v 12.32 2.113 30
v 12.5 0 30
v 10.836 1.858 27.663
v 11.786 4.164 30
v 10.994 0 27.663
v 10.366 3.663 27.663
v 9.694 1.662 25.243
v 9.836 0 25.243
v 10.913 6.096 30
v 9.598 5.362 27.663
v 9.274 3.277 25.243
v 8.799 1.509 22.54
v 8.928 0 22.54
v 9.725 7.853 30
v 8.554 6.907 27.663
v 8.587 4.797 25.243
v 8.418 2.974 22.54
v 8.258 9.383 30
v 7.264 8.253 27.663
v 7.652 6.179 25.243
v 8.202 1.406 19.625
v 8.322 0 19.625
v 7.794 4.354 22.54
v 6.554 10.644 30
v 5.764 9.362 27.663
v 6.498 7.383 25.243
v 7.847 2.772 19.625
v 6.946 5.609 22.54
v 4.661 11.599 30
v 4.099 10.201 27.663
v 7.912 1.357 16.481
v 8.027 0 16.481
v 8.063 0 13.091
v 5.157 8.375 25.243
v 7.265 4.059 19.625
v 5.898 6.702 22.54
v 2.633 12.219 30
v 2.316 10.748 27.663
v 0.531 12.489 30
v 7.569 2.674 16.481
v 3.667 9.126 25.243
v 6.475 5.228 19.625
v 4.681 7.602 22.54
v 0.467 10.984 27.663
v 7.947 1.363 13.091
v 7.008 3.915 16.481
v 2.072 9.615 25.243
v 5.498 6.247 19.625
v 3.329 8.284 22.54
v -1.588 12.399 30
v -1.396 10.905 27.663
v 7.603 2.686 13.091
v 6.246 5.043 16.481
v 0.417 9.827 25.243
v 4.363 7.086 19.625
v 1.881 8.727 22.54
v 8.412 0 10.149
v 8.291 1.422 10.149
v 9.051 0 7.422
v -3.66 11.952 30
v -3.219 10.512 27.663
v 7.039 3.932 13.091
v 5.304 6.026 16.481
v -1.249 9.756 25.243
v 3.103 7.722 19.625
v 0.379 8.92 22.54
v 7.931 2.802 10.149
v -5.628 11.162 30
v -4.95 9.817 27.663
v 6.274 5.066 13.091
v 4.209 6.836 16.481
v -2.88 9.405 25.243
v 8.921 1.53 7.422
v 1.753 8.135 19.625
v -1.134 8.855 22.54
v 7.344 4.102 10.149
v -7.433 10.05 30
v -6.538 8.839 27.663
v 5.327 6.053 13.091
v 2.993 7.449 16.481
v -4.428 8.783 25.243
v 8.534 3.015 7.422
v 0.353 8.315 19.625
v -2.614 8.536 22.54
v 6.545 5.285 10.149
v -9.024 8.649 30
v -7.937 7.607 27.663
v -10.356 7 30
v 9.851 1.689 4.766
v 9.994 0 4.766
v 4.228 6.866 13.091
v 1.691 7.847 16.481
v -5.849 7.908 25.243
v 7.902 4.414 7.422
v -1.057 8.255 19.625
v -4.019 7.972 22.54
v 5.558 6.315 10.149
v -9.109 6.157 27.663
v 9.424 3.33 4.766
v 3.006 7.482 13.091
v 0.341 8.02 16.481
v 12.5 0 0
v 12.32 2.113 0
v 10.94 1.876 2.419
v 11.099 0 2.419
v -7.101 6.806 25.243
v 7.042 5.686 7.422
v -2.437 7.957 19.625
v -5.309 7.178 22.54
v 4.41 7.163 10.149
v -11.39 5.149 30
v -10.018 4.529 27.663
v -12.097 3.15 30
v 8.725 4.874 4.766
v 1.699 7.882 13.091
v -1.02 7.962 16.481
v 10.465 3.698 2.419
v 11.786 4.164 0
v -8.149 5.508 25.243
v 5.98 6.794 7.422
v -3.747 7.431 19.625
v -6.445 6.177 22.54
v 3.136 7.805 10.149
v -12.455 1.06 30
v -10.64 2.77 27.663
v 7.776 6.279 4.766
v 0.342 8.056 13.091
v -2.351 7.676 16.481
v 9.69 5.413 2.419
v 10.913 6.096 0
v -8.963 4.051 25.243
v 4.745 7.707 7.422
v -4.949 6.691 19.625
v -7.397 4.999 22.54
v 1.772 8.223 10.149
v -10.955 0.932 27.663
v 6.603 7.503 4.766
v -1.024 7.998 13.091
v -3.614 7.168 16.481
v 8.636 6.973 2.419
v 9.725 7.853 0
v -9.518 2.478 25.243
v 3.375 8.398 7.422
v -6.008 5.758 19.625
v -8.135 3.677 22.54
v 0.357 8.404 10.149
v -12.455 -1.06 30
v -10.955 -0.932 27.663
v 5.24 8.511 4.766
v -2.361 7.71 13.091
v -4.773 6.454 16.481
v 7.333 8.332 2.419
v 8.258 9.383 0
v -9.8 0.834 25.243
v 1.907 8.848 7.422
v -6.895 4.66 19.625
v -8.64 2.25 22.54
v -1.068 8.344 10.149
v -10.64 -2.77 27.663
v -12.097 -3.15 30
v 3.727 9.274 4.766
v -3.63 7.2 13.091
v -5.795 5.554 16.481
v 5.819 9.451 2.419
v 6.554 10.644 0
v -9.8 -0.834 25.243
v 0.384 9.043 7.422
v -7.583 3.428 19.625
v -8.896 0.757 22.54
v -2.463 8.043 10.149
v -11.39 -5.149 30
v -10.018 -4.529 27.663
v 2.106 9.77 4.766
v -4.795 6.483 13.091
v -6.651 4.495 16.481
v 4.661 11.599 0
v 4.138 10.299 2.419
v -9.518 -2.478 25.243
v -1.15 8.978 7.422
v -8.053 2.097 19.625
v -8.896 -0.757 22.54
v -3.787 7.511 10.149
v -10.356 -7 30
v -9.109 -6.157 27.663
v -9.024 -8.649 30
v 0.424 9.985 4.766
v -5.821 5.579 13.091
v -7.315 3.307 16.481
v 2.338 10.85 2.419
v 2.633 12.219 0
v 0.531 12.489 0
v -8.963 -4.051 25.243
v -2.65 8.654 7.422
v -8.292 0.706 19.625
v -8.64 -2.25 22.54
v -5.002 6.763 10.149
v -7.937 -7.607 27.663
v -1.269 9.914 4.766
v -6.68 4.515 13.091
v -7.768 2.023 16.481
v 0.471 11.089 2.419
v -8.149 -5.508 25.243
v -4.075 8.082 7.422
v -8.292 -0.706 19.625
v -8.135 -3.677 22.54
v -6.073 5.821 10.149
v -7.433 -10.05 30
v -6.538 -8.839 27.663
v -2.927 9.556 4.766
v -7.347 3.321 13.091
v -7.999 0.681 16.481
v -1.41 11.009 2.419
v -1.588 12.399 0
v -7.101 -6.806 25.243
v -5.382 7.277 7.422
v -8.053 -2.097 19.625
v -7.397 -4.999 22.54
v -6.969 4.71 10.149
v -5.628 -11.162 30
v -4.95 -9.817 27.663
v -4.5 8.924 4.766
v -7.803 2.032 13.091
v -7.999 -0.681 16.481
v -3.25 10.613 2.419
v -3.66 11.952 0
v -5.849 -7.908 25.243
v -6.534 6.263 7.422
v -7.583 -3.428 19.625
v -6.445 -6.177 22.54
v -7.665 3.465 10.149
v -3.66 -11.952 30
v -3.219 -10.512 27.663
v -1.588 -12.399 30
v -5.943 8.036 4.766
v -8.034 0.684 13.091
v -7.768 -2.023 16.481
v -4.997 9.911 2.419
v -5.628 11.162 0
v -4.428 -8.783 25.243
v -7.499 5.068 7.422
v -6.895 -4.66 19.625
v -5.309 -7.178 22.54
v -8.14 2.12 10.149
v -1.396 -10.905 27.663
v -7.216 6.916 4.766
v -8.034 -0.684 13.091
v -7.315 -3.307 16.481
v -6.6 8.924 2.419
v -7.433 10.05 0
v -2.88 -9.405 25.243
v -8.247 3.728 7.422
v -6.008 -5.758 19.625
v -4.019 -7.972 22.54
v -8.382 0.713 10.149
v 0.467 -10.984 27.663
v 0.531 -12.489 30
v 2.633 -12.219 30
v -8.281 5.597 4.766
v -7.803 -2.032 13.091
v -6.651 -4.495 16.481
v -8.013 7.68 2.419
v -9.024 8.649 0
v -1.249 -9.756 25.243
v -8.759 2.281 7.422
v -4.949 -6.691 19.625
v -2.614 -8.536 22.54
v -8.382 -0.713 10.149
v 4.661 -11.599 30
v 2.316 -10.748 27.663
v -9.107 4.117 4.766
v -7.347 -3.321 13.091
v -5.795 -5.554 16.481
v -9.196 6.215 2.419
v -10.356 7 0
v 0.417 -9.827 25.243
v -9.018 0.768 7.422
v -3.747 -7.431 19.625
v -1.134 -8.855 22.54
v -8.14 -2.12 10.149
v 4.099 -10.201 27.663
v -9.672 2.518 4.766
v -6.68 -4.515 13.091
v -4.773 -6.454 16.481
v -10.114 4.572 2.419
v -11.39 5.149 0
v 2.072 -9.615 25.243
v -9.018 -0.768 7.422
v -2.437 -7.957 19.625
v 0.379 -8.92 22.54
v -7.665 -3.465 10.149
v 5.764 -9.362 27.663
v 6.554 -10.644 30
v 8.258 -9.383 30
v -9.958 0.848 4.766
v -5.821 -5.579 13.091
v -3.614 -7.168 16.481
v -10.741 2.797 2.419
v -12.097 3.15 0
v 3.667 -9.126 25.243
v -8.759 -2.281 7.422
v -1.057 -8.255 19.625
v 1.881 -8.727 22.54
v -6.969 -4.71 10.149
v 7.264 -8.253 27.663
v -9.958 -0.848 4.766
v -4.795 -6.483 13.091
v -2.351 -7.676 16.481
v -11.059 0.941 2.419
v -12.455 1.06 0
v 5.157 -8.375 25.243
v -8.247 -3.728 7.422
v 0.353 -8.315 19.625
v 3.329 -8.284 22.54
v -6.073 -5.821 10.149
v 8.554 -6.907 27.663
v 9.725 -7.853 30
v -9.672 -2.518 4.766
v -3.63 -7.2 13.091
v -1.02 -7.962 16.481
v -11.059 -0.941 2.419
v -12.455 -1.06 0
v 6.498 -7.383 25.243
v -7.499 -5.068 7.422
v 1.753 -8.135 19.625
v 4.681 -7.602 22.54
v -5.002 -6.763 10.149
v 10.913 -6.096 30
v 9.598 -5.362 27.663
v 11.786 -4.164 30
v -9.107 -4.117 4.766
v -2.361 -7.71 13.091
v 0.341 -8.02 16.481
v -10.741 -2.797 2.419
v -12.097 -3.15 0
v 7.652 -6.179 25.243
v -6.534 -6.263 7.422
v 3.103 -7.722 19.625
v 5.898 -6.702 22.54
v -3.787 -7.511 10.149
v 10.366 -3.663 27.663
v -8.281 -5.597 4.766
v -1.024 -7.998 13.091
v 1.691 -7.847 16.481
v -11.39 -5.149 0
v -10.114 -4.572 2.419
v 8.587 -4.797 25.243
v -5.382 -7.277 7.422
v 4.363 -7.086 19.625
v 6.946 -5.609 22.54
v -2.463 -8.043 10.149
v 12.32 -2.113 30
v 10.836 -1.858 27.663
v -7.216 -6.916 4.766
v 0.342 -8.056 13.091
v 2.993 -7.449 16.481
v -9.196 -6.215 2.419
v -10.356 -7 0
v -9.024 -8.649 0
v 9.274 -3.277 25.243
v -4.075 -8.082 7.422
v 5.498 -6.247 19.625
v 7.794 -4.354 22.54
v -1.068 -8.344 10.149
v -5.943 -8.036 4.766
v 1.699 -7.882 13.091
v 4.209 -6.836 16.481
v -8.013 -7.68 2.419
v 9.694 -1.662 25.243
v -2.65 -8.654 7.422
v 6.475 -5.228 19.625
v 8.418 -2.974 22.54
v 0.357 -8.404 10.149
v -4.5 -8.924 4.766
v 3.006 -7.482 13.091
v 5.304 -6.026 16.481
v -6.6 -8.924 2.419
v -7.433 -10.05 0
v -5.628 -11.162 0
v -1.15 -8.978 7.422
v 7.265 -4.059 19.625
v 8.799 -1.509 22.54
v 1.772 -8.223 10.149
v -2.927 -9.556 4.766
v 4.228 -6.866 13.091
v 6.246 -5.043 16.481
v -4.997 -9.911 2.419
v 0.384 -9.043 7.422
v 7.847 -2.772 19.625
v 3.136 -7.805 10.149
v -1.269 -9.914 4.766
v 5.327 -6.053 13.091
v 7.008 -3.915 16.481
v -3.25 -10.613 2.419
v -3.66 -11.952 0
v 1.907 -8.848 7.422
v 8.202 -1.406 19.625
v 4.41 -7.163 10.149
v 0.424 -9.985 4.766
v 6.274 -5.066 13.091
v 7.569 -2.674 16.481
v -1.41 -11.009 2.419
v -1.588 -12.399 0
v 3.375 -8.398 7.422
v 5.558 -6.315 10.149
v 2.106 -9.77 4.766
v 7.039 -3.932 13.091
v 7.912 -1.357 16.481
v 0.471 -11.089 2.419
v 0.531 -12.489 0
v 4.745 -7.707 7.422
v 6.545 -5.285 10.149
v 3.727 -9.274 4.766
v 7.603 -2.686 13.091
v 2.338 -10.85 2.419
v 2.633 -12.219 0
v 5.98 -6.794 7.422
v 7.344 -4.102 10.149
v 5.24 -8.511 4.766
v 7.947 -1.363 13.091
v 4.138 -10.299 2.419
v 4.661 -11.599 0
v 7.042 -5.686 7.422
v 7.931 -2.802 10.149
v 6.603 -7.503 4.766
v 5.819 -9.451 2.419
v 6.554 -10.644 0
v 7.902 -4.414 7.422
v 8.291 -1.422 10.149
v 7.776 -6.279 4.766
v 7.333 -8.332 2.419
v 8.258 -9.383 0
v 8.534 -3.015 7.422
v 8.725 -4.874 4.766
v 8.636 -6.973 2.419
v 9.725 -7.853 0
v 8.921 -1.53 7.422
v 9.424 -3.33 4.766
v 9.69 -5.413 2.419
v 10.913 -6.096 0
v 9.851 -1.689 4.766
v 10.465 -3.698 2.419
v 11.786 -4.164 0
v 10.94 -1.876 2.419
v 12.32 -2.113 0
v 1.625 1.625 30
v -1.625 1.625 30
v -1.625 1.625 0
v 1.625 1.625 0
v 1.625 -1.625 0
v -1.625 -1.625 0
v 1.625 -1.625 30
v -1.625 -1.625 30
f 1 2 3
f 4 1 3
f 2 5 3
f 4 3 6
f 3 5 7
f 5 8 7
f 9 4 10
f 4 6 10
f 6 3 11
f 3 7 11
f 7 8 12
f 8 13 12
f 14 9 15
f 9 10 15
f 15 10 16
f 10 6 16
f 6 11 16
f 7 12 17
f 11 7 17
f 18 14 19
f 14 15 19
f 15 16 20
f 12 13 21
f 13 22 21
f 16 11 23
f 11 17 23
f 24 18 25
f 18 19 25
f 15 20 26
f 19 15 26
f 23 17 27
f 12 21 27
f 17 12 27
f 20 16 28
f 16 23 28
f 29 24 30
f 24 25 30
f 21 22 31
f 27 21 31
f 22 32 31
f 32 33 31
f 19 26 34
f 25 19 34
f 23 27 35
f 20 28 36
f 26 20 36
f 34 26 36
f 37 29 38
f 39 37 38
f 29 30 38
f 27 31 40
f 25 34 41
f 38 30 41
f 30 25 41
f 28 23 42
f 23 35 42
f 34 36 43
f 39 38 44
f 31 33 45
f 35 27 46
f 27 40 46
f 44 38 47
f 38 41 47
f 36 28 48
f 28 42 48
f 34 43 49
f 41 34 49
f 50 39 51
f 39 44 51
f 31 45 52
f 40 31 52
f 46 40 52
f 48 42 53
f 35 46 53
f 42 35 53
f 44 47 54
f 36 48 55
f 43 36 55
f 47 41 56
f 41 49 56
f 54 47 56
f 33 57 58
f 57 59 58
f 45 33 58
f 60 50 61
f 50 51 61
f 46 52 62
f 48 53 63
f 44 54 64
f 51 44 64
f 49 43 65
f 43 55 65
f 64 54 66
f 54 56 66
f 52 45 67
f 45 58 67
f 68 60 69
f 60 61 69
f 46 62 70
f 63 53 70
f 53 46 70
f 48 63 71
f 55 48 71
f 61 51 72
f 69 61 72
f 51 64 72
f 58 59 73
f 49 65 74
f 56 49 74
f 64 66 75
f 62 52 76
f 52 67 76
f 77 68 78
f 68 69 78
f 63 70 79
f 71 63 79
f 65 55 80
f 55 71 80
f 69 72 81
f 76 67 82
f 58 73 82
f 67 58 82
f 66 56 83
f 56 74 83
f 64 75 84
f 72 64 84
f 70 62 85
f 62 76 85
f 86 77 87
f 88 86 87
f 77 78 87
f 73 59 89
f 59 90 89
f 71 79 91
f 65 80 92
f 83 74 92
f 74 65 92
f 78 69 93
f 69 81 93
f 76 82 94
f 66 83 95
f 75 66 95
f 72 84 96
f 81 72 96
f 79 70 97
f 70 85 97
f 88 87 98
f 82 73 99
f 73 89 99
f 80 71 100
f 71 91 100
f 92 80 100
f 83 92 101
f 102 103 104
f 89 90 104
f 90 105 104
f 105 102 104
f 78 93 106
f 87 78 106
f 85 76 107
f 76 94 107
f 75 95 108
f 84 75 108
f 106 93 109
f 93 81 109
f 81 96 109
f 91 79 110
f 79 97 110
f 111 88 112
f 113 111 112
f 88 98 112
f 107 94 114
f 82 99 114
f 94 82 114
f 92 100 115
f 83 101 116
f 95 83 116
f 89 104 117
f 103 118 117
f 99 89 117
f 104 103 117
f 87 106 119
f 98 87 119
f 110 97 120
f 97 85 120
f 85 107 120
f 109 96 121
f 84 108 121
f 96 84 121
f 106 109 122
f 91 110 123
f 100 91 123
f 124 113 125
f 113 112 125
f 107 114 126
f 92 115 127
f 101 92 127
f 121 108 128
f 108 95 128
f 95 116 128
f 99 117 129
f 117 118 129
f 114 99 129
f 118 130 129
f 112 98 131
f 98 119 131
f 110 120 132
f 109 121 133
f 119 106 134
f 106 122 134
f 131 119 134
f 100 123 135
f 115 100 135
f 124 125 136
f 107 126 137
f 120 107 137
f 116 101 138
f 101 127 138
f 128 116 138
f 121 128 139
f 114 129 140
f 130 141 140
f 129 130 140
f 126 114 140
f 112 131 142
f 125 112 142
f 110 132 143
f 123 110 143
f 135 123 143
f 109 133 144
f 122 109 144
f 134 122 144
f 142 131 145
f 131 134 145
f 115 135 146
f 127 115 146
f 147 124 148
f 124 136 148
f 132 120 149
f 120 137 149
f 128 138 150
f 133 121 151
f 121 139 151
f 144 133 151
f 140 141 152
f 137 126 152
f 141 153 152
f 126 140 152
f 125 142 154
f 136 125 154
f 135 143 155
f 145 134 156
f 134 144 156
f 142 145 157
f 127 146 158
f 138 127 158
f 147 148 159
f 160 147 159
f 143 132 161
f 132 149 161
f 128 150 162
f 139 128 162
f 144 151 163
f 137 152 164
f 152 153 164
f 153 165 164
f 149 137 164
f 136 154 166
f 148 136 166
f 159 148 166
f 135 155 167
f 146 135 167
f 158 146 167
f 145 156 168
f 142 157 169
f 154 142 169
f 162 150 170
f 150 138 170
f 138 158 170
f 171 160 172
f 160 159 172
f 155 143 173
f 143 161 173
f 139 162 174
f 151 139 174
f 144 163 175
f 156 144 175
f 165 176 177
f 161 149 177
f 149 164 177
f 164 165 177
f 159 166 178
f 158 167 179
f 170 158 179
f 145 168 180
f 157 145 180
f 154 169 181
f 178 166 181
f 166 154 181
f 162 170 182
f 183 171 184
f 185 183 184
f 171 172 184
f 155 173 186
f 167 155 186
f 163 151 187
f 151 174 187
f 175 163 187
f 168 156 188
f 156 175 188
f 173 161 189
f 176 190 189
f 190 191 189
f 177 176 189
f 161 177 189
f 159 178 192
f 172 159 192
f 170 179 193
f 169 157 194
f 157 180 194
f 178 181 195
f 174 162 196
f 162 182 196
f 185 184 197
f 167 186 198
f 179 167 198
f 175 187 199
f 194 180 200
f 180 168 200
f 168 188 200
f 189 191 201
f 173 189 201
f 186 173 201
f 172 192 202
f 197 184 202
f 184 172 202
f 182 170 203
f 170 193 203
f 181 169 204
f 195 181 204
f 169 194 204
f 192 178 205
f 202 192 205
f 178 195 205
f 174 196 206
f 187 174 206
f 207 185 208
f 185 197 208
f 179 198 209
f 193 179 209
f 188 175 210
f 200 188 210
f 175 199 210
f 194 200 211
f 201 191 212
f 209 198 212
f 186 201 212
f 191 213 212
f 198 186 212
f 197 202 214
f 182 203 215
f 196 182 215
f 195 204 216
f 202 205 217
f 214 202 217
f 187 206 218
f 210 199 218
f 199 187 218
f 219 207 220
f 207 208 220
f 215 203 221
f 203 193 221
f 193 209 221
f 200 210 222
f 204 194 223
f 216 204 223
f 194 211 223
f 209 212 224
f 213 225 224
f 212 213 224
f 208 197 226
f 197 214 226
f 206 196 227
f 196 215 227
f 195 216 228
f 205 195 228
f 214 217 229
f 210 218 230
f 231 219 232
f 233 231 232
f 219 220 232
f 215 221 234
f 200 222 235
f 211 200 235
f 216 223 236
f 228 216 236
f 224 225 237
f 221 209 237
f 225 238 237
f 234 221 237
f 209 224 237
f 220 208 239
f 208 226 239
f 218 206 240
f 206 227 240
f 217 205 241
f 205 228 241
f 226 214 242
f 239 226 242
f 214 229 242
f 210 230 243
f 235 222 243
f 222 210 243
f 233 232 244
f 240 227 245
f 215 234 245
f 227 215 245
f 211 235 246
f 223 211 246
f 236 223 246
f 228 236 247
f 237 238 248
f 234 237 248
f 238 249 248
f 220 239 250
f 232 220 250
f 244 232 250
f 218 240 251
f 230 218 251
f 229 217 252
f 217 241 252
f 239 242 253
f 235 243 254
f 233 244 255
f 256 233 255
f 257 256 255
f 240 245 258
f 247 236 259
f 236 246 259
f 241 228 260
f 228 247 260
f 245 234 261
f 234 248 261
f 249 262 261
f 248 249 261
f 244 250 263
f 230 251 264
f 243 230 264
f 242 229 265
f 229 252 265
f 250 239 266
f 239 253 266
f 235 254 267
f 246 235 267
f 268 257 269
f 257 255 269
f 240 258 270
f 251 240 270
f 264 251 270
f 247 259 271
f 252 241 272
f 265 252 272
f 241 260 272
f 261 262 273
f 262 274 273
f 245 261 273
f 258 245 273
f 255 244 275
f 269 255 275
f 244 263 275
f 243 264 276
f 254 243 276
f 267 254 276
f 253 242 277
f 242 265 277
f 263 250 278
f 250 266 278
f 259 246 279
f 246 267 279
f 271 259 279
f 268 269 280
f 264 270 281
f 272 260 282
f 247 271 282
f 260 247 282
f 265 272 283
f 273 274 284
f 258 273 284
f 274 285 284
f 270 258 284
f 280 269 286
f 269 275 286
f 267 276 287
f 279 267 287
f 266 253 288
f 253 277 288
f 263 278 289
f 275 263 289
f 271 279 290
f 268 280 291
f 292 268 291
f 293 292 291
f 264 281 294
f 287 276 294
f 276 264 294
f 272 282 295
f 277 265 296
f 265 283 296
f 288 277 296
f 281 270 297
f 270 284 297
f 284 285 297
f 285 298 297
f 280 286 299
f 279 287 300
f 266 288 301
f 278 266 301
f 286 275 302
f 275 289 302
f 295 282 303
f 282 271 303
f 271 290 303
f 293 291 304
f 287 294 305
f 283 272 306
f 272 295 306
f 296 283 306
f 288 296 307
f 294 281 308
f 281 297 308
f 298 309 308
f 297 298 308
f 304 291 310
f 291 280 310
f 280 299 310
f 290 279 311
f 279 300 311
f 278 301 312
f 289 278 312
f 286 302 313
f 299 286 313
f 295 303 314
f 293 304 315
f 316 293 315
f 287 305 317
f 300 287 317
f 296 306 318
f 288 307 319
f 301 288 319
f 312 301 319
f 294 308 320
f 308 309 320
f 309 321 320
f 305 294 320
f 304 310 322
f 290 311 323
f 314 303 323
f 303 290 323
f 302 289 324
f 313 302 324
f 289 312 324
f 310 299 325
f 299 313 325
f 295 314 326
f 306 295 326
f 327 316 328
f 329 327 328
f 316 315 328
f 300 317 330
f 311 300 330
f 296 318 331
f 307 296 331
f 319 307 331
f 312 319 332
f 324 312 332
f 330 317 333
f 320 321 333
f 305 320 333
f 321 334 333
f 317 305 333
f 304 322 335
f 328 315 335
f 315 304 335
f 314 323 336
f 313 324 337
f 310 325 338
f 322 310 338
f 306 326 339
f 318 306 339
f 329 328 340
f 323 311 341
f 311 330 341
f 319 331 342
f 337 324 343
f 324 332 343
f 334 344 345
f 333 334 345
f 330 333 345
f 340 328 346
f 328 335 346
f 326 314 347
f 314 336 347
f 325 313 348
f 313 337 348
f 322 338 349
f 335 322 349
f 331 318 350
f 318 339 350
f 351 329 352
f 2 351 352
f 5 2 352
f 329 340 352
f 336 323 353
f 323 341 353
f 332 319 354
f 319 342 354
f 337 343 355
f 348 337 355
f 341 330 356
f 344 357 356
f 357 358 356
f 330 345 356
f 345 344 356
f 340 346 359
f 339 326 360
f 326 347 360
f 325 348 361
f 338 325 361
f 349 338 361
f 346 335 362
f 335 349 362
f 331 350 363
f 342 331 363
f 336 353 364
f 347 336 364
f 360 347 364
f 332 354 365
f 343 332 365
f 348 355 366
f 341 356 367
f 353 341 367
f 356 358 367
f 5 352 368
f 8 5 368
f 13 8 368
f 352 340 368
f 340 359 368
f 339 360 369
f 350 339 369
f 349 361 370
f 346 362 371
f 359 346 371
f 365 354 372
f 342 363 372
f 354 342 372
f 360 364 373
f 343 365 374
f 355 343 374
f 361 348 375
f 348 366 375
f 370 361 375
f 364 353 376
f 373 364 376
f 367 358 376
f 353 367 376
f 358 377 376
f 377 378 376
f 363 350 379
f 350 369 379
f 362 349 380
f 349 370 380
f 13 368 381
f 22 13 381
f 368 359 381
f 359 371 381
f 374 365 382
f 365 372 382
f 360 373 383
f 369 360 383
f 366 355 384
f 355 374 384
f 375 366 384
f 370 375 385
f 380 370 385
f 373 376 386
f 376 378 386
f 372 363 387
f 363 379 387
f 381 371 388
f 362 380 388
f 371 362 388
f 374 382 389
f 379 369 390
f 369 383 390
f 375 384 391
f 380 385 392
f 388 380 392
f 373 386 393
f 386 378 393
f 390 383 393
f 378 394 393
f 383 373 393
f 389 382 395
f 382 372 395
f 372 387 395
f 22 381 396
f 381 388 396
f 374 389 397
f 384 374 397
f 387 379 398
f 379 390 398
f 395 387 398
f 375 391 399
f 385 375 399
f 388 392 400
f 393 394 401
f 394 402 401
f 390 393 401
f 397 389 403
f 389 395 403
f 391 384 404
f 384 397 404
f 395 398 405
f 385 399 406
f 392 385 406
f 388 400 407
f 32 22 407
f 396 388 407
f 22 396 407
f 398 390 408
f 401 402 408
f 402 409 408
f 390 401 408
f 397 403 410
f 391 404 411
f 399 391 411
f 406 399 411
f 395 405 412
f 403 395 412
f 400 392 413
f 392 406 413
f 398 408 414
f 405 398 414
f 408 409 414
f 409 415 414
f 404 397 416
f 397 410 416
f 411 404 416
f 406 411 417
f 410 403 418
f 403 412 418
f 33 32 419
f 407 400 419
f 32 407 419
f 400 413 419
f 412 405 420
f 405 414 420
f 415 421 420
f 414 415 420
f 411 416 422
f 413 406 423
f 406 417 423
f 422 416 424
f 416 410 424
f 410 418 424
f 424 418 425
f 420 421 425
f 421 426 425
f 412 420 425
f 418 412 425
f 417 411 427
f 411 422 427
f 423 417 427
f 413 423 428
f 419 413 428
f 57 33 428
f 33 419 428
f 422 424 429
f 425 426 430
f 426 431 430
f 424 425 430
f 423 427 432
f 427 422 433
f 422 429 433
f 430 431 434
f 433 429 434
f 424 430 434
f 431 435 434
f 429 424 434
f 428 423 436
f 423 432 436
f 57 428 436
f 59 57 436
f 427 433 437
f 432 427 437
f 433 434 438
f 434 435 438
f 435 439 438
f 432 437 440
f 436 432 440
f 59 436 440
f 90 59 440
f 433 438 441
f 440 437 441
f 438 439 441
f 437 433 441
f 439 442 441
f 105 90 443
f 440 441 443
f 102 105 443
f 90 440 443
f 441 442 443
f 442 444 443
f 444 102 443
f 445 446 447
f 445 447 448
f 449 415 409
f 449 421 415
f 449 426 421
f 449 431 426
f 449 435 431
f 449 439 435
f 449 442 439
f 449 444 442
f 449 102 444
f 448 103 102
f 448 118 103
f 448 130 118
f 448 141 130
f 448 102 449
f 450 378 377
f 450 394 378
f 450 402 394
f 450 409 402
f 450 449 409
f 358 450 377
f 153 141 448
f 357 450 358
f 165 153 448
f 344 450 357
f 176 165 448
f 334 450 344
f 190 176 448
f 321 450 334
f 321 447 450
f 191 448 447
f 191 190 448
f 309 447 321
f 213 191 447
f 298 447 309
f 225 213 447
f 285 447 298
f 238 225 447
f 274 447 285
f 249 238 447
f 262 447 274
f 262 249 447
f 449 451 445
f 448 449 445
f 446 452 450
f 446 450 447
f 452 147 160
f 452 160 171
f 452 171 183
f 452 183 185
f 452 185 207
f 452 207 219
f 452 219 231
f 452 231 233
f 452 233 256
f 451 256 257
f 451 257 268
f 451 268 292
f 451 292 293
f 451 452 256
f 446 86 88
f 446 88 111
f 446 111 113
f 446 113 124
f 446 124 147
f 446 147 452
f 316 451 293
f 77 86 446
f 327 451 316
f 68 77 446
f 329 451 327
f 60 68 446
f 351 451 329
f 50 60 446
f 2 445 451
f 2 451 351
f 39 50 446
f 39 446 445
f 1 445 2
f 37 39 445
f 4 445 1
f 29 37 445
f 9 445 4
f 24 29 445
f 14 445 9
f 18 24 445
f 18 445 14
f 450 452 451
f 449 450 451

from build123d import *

# Parameters (mm, degrees)
F2_W     = 3.25
F2_H     = 3.25
F3_DEPTH = 30.001


with BuildPart() as f1:
    # F0 (on Front) → F1 (revolve)
    with BuildSketch(Plane.XZ):
        with BuildLine():
            Line((0, 30), (0, 0))
            Line((0, 0), (12.5, 0))
            add(Edge.make_bspline(
                [(12.5, 30), (9.055907, 25.34046), (6.907983, 14.663109), (9.128126, 5.333321), (12.5, 0)],
                knots=[0, 0, 0, 0, 15.66046, 31.32092, 31.32092, 31.32092, 31.32092], degree=3))
            Line((12.5, 30), (0, 30))
        make_face()
    revolve(axis=Axis((0, 0, 15), (0, 0, 1)))

    # F2 (on face) → F3 (cut, through all)
    with BuildSketch(Plane.XY.offset(30)):
        Rectangle(F2_W, F2_H)
    extrude(amount=-F3_DEPTH, mode=Mode.SUBTRACT)


solid = f1.part
